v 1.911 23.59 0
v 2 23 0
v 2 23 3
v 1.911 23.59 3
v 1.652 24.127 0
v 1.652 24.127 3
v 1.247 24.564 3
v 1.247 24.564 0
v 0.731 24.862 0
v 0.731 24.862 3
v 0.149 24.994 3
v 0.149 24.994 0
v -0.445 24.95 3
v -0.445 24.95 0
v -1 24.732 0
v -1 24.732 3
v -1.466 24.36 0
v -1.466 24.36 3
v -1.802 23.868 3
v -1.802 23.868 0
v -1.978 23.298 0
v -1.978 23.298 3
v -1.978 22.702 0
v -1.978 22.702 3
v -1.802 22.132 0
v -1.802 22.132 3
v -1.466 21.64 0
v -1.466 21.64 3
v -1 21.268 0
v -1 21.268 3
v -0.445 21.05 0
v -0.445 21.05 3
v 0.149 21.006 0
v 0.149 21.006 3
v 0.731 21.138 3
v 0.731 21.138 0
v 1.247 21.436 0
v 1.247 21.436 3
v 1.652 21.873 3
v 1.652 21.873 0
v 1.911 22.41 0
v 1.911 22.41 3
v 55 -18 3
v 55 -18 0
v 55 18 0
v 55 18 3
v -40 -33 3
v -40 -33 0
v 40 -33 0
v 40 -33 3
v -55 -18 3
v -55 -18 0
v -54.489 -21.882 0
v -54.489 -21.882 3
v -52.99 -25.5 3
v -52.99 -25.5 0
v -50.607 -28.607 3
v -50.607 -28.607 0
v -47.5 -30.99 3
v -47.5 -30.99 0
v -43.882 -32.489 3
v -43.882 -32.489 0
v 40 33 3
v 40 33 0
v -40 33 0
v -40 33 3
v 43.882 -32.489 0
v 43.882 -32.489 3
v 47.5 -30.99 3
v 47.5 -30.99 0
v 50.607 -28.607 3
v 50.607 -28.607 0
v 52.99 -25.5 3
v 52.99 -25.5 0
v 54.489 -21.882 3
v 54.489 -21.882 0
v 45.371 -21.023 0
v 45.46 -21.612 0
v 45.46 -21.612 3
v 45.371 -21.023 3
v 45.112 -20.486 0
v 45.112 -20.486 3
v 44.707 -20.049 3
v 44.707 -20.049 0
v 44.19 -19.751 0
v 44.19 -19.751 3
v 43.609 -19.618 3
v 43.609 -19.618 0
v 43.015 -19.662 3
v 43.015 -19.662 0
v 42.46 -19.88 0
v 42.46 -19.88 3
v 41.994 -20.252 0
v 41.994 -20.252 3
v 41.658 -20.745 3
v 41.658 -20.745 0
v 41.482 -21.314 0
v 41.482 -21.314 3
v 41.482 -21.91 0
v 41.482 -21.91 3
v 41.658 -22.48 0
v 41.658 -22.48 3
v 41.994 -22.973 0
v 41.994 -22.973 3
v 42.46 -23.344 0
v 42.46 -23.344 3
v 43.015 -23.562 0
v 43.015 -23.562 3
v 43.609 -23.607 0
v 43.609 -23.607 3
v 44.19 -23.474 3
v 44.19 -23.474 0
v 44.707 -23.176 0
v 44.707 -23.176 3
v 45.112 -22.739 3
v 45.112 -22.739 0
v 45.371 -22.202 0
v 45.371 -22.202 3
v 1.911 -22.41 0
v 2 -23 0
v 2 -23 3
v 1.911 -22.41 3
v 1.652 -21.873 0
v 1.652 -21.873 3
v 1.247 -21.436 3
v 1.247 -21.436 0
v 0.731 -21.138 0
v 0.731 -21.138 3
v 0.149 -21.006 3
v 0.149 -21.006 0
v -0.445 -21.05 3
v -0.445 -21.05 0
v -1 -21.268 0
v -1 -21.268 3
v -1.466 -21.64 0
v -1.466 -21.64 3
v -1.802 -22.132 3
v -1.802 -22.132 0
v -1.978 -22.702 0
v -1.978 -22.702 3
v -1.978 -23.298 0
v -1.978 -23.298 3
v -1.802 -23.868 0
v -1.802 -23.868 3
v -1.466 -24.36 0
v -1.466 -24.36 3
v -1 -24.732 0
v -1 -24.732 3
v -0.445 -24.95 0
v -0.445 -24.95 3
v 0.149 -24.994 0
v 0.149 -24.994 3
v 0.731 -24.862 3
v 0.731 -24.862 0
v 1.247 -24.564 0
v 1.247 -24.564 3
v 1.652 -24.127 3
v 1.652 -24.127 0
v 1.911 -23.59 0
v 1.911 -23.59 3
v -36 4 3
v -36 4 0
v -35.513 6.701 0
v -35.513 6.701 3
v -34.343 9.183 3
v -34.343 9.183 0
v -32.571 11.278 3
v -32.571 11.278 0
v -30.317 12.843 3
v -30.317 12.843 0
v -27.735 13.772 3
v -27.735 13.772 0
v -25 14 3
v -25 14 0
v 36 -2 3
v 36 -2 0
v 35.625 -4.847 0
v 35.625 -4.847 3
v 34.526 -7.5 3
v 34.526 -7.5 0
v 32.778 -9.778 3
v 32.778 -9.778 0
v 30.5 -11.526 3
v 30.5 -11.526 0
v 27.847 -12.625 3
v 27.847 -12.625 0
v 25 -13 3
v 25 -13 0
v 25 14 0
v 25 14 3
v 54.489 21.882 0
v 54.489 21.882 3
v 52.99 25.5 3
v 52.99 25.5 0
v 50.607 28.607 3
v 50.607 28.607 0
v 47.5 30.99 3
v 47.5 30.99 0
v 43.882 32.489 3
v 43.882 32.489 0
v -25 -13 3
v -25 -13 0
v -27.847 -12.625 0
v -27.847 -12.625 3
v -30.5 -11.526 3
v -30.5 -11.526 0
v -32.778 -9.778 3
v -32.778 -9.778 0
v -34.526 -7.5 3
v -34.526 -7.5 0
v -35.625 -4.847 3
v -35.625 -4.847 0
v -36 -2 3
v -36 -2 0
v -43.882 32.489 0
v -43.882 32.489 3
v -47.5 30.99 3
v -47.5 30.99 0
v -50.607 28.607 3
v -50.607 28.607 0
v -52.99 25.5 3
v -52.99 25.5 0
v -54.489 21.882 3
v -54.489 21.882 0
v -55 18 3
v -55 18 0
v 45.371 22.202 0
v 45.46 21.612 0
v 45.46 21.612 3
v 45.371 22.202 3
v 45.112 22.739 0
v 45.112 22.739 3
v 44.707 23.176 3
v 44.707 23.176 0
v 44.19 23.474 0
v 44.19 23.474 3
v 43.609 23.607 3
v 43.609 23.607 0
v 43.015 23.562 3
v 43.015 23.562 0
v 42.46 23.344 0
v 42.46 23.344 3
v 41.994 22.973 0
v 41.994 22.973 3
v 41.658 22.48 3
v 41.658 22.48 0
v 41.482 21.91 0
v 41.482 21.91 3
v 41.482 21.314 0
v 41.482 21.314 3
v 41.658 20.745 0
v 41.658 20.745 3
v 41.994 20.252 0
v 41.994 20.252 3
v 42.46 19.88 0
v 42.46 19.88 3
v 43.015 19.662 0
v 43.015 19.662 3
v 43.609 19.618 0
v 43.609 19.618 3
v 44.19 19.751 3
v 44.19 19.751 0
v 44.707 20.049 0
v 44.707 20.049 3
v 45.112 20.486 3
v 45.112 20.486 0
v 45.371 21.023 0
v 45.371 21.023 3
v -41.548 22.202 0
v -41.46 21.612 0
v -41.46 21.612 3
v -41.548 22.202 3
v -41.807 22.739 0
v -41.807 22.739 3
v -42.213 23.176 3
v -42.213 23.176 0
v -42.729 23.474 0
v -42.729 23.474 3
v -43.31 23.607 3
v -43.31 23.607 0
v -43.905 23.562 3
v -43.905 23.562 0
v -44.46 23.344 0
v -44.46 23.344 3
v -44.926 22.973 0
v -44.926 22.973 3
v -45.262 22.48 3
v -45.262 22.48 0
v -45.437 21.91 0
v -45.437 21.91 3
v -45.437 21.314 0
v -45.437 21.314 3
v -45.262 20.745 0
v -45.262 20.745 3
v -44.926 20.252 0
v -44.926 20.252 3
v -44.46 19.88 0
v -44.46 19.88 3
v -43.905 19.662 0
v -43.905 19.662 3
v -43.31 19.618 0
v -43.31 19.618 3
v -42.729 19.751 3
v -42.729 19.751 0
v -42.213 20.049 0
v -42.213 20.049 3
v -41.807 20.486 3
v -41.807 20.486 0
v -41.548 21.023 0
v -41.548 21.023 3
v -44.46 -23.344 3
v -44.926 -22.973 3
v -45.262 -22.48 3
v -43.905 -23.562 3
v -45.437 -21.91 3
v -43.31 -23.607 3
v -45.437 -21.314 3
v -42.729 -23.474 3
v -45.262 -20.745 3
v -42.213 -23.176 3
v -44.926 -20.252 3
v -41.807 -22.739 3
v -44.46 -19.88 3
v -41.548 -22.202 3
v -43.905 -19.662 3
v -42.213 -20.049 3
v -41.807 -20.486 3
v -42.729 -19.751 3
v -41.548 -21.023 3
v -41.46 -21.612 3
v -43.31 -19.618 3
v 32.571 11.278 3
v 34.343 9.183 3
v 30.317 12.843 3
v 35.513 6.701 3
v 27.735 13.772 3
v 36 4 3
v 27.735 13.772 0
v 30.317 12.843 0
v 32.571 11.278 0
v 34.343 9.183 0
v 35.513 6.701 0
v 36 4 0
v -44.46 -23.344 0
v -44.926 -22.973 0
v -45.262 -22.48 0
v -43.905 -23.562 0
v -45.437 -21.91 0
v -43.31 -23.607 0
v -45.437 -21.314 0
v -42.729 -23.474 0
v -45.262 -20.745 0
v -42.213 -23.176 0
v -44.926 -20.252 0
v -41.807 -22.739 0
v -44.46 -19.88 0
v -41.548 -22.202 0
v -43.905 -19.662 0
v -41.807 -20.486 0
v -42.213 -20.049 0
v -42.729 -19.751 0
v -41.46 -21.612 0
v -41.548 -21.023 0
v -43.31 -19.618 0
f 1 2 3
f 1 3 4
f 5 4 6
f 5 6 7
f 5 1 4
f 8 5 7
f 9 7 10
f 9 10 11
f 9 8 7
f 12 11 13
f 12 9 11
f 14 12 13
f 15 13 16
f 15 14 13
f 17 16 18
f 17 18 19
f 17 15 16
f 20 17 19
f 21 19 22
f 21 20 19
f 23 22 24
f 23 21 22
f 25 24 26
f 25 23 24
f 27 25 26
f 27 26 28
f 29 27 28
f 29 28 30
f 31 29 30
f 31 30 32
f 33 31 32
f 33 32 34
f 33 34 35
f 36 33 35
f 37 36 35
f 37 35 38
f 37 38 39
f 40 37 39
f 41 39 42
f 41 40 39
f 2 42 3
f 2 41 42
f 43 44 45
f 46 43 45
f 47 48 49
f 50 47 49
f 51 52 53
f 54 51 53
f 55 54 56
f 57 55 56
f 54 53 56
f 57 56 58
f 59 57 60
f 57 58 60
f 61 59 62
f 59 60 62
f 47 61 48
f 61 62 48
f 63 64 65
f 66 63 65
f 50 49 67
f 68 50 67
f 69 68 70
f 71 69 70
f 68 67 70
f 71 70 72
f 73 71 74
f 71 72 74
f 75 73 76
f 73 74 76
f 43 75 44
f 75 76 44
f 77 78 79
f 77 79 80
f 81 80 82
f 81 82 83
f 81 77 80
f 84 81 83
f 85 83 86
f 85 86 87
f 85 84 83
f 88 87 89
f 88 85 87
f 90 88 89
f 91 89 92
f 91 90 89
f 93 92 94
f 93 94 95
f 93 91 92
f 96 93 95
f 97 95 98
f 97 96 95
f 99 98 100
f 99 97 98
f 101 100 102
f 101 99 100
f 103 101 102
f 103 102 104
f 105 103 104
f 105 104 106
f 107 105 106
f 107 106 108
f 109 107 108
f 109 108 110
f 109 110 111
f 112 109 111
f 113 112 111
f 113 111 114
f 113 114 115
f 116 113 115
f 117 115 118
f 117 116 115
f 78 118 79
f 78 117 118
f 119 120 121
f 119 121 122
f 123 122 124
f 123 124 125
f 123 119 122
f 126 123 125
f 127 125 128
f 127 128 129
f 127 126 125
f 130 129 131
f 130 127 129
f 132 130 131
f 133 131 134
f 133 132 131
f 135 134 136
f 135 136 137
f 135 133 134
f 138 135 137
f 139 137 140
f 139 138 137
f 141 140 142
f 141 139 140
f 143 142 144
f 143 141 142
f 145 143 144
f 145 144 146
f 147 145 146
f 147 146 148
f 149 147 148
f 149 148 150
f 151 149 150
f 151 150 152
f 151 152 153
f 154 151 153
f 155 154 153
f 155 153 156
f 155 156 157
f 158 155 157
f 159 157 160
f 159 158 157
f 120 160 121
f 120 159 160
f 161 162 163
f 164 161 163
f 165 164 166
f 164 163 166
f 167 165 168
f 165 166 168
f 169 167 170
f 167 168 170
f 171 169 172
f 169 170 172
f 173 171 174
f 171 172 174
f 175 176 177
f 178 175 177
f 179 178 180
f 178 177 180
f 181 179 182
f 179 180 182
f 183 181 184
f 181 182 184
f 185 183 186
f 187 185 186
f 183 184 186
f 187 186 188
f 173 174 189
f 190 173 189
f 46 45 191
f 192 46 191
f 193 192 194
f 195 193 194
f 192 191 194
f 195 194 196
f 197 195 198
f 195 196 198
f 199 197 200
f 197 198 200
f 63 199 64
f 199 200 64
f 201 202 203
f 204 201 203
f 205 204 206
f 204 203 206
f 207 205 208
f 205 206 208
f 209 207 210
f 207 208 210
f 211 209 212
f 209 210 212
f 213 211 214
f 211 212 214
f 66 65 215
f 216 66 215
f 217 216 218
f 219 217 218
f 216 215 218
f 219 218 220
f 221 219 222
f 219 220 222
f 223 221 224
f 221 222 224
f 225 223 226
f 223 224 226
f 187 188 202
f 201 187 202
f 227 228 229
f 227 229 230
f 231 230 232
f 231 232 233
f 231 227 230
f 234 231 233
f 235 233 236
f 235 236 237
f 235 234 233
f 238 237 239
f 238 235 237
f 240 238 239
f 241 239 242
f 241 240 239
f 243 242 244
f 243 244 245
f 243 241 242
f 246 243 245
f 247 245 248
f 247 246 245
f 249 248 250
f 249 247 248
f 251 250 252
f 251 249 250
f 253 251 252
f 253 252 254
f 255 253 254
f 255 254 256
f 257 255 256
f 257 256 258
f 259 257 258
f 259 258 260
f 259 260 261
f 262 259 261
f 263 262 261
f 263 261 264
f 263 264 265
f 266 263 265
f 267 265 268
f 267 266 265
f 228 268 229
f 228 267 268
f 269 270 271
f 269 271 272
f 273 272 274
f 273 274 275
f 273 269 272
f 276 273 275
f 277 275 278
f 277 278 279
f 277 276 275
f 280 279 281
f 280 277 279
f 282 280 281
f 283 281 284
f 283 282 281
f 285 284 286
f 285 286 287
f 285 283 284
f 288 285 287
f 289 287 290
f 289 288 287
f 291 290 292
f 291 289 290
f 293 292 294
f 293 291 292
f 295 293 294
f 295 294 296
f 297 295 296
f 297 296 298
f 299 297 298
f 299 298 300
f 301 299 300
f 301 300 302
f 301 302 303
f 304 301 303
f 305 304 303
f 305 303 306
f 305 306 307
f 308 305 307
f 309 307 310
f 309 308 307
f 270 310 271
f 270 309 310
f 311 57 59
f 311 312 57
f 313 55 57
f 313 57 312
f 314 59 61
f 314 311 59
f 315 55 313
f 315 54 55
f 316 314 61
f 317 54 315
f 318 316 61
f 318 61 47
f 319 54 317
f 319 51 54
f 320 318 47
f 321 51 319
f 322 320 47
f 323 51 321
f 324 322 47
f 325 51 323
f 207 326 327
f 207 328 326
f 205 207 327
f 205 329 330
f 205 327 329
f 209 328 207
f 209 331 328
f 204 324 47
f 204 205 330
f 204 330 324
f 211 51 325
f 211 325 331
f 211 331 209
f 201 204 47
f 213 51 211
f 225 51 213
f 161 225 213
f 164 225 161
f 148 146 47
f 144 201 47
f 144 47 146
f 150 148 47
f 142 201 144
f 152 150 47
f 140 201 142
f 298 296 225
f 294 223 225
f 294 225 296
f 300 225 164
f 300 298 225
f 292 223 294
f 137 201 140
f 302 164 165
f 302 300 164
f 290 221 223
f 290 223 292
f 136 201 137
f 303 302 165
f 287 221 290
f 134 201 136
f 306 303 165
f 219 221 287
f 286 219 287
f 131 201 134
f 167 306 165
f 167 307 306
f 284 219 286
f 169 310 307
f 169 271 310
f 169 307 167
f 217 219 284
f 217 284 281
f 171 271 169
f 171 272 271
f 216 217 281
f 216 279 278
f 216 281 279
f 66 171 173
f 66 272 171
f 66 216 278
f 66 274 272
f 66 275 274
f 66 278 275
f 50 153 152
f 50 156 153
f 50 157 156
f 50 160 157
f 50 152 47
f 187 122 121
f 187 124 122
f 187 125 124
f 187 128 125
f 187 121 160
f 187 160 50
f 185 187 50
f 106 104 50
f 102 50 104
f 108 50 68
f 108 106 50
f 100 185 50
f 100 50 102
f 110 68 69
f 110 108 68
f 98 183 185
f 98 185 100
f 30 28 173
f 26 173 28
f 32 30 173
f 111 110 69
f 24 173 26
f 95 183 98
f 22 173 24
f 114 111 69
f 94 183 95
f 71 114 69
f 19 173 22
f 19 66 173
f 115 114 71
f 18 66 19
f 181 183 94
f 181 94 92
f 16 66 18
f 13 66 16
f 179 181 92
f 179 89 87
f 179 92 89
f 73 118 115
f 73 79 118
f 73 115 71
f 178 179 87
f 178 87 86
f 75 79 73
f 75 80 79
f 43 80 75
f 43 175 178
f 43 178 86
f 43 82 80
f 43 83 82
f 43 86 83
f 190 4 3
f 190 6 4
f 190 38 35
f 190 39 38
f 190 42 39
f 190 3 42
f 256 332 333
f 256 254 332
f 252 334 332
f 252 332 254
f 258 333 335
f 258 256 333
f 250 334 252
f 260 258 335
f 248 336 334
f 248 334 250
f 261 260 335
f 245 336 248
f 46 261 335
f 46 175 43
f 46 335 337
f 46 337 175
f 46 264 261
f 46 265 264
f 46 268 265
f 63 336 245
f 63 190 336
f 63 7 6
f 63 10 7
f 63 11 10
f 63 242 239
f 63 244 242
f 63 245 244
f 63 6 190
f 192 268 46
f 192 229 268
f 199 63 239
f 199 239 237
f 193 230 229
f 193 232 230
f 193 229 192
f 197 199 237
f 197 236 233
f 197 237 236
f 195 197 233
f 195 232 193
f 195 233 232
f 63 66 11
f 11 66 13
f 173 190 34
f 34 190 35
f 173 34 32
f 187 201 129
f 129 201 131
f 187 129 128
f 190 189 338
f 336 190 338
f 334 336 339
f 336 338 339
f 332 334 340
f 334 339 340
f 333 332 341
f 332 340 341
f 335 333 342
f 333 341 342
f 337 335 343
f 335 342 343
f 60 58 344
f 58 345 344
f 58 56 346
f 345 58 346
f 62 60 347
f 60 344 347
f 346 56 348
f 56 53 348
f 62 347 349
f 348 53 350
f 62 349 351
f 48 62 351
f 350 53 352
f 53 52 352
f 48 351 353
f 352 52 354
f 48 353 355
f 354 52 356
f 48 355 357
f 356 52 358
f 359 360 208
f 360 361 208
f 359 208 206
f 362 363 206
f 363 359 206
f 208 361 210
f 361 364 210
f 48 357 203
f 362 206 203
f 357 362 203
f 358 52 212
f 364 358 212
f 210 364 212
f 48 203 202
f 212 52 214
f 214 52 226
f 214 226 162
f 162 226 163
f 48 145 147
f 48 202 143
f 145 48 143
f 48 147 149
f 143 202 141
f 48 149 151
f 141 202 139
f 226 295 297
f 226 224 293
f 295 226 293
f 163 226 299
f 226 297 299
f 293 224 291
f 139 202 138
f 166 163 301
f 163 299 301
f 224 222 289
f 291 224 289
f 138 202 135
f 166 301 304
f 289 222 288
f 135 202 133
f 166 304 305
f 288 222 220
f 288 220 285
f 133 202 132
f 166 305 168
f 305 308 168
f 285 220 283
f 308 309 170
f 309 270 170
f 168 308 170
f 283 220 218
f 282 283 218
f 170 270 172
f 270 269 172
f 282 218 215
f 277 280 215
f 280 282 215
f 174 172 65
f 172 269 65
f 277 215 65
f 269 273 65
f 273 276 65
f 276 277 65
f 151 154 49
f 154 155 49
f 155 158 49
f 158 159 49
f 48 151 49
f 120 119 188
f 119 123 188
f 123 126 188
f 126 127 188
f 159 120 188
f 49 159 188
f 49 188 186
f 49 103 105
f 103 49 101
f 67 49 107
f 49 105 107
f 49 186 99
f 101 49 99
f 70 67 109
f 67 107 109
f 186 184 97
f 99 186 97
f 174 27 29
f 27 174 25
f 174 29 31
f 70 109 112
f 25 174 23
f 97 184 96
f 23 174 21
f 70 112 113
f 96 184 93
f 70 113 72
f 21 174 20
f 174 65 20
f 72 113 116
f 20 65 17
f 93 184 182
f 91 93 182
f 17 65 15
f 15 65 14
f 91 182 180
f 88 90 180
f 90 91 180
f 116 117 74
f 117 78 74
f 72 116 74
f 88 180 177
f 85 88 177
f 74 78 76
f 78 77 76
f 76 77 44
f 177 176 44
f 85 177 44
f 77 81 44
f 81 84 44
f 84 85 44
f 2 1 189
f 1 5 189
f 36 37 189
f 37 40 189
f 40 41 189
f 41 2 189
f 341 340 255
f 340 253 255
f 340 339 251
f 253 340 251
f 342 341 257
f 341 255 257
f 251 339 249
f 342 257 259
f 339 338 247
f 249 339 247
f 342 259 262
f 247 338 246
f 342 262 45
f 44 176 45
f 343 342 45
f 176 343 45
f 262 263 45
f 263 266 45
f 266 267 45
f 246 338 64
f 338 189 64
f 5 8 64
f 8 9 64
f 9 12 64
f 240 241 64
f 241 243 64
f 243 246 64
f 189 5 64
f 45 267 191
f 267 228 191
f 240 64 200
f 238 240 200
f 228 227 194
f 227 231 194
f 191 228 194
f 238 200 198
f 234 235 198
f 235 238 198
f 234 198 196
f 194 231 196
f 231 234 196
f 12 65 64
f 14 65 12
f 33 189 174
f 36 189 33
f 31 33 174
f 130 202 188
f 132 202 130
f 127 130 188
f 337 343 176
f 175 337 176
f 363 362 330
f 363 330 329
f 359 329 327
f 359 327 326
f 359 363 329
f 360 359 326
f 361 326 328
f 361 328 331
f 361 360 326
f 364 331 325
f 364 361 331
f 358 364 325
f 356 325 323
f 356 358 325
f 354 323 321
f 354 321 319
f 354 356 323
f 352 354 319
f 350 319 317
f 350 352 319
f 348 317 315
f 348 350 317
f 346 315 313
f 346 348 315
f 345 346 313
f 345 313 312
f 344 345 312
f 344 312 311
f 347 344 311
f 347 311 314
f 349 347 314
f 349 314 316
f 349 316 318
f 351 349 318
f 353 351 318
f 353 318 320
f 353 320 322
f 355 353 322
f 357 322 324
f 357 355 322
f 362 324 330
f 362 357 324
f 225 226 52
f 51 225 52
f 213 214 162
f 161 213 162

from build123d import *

# Parameters (mm, degrees)
F0_R     = 2
F1_DEPTH = 3


with BuildPart() as f1:
    # F0 (on Top) → F1 (new body)
    with BuildSketch(Plane.XY):
        with BuildLine():
            Line((-40, -33), (40, -33))
            ThreePointArc((40, -33), (50.606602, -28.606602), (55, -18))
            Line((55, -18), (55, 18))
            ThreePointArc((55, 18), (50.606602, 28.606602), (40, 33))
            Line((40, 33), (-40, 33))
            ThreePointArc((-40, 33), (-50.606602, 28.606602), (-55, 18))
            Line((-55, 18), (-55, -18))
            ThreePointArc((-55, -18), (-50.606602, -28.606602), (-40, -33))
        make_face()
        with Locations((-43.45962, -21.612271)):
            Circle(F0_R, mode=Mode.SUBTRACT)
        with Locations((0, -23)):
            Circle(F0_R, mode=Mode.SUBTRACT)
        with Locations((43.45962, -21.612271)):
            Circle(F0_R, mode=Mode.SUBTRACT)
        with Locations((-43.45962, 21.612271)):
            Circle(F0_R, mode=Mode.SUBTRACT)
        with BuildLine():
            ThreePointArc((-36, 4), (-32.571068, 11.278175), (-25, 14))
            Line((-25, 14), (25, 14))
            ThreePointArc((25, 14), (32.571068, 11.278175), (36, 4))
            Line((36, 4), (36, -2))
            ThreePointArc((36, -2), (32.778175, -9.778175), (25, -13))
            Line((25, -13), (-25, -13))
            ThreePointArc((-25, -13), (-32.778175, -9.778175), (-36, -2))
            Line((-36, -2), (-36, 4))
        make_face(mode=Mode.SUBTRACT)
        with Locations((0, 23)):
            Circle(F0_R, mode=Mode.SUBTRACT)
        with Locations((43.45962, 21.612271)):
            Circle(F0_R, mode=Mode.SUBTRACT)
    extrude(amount=F1_DEPTH)


solid = f1.part
